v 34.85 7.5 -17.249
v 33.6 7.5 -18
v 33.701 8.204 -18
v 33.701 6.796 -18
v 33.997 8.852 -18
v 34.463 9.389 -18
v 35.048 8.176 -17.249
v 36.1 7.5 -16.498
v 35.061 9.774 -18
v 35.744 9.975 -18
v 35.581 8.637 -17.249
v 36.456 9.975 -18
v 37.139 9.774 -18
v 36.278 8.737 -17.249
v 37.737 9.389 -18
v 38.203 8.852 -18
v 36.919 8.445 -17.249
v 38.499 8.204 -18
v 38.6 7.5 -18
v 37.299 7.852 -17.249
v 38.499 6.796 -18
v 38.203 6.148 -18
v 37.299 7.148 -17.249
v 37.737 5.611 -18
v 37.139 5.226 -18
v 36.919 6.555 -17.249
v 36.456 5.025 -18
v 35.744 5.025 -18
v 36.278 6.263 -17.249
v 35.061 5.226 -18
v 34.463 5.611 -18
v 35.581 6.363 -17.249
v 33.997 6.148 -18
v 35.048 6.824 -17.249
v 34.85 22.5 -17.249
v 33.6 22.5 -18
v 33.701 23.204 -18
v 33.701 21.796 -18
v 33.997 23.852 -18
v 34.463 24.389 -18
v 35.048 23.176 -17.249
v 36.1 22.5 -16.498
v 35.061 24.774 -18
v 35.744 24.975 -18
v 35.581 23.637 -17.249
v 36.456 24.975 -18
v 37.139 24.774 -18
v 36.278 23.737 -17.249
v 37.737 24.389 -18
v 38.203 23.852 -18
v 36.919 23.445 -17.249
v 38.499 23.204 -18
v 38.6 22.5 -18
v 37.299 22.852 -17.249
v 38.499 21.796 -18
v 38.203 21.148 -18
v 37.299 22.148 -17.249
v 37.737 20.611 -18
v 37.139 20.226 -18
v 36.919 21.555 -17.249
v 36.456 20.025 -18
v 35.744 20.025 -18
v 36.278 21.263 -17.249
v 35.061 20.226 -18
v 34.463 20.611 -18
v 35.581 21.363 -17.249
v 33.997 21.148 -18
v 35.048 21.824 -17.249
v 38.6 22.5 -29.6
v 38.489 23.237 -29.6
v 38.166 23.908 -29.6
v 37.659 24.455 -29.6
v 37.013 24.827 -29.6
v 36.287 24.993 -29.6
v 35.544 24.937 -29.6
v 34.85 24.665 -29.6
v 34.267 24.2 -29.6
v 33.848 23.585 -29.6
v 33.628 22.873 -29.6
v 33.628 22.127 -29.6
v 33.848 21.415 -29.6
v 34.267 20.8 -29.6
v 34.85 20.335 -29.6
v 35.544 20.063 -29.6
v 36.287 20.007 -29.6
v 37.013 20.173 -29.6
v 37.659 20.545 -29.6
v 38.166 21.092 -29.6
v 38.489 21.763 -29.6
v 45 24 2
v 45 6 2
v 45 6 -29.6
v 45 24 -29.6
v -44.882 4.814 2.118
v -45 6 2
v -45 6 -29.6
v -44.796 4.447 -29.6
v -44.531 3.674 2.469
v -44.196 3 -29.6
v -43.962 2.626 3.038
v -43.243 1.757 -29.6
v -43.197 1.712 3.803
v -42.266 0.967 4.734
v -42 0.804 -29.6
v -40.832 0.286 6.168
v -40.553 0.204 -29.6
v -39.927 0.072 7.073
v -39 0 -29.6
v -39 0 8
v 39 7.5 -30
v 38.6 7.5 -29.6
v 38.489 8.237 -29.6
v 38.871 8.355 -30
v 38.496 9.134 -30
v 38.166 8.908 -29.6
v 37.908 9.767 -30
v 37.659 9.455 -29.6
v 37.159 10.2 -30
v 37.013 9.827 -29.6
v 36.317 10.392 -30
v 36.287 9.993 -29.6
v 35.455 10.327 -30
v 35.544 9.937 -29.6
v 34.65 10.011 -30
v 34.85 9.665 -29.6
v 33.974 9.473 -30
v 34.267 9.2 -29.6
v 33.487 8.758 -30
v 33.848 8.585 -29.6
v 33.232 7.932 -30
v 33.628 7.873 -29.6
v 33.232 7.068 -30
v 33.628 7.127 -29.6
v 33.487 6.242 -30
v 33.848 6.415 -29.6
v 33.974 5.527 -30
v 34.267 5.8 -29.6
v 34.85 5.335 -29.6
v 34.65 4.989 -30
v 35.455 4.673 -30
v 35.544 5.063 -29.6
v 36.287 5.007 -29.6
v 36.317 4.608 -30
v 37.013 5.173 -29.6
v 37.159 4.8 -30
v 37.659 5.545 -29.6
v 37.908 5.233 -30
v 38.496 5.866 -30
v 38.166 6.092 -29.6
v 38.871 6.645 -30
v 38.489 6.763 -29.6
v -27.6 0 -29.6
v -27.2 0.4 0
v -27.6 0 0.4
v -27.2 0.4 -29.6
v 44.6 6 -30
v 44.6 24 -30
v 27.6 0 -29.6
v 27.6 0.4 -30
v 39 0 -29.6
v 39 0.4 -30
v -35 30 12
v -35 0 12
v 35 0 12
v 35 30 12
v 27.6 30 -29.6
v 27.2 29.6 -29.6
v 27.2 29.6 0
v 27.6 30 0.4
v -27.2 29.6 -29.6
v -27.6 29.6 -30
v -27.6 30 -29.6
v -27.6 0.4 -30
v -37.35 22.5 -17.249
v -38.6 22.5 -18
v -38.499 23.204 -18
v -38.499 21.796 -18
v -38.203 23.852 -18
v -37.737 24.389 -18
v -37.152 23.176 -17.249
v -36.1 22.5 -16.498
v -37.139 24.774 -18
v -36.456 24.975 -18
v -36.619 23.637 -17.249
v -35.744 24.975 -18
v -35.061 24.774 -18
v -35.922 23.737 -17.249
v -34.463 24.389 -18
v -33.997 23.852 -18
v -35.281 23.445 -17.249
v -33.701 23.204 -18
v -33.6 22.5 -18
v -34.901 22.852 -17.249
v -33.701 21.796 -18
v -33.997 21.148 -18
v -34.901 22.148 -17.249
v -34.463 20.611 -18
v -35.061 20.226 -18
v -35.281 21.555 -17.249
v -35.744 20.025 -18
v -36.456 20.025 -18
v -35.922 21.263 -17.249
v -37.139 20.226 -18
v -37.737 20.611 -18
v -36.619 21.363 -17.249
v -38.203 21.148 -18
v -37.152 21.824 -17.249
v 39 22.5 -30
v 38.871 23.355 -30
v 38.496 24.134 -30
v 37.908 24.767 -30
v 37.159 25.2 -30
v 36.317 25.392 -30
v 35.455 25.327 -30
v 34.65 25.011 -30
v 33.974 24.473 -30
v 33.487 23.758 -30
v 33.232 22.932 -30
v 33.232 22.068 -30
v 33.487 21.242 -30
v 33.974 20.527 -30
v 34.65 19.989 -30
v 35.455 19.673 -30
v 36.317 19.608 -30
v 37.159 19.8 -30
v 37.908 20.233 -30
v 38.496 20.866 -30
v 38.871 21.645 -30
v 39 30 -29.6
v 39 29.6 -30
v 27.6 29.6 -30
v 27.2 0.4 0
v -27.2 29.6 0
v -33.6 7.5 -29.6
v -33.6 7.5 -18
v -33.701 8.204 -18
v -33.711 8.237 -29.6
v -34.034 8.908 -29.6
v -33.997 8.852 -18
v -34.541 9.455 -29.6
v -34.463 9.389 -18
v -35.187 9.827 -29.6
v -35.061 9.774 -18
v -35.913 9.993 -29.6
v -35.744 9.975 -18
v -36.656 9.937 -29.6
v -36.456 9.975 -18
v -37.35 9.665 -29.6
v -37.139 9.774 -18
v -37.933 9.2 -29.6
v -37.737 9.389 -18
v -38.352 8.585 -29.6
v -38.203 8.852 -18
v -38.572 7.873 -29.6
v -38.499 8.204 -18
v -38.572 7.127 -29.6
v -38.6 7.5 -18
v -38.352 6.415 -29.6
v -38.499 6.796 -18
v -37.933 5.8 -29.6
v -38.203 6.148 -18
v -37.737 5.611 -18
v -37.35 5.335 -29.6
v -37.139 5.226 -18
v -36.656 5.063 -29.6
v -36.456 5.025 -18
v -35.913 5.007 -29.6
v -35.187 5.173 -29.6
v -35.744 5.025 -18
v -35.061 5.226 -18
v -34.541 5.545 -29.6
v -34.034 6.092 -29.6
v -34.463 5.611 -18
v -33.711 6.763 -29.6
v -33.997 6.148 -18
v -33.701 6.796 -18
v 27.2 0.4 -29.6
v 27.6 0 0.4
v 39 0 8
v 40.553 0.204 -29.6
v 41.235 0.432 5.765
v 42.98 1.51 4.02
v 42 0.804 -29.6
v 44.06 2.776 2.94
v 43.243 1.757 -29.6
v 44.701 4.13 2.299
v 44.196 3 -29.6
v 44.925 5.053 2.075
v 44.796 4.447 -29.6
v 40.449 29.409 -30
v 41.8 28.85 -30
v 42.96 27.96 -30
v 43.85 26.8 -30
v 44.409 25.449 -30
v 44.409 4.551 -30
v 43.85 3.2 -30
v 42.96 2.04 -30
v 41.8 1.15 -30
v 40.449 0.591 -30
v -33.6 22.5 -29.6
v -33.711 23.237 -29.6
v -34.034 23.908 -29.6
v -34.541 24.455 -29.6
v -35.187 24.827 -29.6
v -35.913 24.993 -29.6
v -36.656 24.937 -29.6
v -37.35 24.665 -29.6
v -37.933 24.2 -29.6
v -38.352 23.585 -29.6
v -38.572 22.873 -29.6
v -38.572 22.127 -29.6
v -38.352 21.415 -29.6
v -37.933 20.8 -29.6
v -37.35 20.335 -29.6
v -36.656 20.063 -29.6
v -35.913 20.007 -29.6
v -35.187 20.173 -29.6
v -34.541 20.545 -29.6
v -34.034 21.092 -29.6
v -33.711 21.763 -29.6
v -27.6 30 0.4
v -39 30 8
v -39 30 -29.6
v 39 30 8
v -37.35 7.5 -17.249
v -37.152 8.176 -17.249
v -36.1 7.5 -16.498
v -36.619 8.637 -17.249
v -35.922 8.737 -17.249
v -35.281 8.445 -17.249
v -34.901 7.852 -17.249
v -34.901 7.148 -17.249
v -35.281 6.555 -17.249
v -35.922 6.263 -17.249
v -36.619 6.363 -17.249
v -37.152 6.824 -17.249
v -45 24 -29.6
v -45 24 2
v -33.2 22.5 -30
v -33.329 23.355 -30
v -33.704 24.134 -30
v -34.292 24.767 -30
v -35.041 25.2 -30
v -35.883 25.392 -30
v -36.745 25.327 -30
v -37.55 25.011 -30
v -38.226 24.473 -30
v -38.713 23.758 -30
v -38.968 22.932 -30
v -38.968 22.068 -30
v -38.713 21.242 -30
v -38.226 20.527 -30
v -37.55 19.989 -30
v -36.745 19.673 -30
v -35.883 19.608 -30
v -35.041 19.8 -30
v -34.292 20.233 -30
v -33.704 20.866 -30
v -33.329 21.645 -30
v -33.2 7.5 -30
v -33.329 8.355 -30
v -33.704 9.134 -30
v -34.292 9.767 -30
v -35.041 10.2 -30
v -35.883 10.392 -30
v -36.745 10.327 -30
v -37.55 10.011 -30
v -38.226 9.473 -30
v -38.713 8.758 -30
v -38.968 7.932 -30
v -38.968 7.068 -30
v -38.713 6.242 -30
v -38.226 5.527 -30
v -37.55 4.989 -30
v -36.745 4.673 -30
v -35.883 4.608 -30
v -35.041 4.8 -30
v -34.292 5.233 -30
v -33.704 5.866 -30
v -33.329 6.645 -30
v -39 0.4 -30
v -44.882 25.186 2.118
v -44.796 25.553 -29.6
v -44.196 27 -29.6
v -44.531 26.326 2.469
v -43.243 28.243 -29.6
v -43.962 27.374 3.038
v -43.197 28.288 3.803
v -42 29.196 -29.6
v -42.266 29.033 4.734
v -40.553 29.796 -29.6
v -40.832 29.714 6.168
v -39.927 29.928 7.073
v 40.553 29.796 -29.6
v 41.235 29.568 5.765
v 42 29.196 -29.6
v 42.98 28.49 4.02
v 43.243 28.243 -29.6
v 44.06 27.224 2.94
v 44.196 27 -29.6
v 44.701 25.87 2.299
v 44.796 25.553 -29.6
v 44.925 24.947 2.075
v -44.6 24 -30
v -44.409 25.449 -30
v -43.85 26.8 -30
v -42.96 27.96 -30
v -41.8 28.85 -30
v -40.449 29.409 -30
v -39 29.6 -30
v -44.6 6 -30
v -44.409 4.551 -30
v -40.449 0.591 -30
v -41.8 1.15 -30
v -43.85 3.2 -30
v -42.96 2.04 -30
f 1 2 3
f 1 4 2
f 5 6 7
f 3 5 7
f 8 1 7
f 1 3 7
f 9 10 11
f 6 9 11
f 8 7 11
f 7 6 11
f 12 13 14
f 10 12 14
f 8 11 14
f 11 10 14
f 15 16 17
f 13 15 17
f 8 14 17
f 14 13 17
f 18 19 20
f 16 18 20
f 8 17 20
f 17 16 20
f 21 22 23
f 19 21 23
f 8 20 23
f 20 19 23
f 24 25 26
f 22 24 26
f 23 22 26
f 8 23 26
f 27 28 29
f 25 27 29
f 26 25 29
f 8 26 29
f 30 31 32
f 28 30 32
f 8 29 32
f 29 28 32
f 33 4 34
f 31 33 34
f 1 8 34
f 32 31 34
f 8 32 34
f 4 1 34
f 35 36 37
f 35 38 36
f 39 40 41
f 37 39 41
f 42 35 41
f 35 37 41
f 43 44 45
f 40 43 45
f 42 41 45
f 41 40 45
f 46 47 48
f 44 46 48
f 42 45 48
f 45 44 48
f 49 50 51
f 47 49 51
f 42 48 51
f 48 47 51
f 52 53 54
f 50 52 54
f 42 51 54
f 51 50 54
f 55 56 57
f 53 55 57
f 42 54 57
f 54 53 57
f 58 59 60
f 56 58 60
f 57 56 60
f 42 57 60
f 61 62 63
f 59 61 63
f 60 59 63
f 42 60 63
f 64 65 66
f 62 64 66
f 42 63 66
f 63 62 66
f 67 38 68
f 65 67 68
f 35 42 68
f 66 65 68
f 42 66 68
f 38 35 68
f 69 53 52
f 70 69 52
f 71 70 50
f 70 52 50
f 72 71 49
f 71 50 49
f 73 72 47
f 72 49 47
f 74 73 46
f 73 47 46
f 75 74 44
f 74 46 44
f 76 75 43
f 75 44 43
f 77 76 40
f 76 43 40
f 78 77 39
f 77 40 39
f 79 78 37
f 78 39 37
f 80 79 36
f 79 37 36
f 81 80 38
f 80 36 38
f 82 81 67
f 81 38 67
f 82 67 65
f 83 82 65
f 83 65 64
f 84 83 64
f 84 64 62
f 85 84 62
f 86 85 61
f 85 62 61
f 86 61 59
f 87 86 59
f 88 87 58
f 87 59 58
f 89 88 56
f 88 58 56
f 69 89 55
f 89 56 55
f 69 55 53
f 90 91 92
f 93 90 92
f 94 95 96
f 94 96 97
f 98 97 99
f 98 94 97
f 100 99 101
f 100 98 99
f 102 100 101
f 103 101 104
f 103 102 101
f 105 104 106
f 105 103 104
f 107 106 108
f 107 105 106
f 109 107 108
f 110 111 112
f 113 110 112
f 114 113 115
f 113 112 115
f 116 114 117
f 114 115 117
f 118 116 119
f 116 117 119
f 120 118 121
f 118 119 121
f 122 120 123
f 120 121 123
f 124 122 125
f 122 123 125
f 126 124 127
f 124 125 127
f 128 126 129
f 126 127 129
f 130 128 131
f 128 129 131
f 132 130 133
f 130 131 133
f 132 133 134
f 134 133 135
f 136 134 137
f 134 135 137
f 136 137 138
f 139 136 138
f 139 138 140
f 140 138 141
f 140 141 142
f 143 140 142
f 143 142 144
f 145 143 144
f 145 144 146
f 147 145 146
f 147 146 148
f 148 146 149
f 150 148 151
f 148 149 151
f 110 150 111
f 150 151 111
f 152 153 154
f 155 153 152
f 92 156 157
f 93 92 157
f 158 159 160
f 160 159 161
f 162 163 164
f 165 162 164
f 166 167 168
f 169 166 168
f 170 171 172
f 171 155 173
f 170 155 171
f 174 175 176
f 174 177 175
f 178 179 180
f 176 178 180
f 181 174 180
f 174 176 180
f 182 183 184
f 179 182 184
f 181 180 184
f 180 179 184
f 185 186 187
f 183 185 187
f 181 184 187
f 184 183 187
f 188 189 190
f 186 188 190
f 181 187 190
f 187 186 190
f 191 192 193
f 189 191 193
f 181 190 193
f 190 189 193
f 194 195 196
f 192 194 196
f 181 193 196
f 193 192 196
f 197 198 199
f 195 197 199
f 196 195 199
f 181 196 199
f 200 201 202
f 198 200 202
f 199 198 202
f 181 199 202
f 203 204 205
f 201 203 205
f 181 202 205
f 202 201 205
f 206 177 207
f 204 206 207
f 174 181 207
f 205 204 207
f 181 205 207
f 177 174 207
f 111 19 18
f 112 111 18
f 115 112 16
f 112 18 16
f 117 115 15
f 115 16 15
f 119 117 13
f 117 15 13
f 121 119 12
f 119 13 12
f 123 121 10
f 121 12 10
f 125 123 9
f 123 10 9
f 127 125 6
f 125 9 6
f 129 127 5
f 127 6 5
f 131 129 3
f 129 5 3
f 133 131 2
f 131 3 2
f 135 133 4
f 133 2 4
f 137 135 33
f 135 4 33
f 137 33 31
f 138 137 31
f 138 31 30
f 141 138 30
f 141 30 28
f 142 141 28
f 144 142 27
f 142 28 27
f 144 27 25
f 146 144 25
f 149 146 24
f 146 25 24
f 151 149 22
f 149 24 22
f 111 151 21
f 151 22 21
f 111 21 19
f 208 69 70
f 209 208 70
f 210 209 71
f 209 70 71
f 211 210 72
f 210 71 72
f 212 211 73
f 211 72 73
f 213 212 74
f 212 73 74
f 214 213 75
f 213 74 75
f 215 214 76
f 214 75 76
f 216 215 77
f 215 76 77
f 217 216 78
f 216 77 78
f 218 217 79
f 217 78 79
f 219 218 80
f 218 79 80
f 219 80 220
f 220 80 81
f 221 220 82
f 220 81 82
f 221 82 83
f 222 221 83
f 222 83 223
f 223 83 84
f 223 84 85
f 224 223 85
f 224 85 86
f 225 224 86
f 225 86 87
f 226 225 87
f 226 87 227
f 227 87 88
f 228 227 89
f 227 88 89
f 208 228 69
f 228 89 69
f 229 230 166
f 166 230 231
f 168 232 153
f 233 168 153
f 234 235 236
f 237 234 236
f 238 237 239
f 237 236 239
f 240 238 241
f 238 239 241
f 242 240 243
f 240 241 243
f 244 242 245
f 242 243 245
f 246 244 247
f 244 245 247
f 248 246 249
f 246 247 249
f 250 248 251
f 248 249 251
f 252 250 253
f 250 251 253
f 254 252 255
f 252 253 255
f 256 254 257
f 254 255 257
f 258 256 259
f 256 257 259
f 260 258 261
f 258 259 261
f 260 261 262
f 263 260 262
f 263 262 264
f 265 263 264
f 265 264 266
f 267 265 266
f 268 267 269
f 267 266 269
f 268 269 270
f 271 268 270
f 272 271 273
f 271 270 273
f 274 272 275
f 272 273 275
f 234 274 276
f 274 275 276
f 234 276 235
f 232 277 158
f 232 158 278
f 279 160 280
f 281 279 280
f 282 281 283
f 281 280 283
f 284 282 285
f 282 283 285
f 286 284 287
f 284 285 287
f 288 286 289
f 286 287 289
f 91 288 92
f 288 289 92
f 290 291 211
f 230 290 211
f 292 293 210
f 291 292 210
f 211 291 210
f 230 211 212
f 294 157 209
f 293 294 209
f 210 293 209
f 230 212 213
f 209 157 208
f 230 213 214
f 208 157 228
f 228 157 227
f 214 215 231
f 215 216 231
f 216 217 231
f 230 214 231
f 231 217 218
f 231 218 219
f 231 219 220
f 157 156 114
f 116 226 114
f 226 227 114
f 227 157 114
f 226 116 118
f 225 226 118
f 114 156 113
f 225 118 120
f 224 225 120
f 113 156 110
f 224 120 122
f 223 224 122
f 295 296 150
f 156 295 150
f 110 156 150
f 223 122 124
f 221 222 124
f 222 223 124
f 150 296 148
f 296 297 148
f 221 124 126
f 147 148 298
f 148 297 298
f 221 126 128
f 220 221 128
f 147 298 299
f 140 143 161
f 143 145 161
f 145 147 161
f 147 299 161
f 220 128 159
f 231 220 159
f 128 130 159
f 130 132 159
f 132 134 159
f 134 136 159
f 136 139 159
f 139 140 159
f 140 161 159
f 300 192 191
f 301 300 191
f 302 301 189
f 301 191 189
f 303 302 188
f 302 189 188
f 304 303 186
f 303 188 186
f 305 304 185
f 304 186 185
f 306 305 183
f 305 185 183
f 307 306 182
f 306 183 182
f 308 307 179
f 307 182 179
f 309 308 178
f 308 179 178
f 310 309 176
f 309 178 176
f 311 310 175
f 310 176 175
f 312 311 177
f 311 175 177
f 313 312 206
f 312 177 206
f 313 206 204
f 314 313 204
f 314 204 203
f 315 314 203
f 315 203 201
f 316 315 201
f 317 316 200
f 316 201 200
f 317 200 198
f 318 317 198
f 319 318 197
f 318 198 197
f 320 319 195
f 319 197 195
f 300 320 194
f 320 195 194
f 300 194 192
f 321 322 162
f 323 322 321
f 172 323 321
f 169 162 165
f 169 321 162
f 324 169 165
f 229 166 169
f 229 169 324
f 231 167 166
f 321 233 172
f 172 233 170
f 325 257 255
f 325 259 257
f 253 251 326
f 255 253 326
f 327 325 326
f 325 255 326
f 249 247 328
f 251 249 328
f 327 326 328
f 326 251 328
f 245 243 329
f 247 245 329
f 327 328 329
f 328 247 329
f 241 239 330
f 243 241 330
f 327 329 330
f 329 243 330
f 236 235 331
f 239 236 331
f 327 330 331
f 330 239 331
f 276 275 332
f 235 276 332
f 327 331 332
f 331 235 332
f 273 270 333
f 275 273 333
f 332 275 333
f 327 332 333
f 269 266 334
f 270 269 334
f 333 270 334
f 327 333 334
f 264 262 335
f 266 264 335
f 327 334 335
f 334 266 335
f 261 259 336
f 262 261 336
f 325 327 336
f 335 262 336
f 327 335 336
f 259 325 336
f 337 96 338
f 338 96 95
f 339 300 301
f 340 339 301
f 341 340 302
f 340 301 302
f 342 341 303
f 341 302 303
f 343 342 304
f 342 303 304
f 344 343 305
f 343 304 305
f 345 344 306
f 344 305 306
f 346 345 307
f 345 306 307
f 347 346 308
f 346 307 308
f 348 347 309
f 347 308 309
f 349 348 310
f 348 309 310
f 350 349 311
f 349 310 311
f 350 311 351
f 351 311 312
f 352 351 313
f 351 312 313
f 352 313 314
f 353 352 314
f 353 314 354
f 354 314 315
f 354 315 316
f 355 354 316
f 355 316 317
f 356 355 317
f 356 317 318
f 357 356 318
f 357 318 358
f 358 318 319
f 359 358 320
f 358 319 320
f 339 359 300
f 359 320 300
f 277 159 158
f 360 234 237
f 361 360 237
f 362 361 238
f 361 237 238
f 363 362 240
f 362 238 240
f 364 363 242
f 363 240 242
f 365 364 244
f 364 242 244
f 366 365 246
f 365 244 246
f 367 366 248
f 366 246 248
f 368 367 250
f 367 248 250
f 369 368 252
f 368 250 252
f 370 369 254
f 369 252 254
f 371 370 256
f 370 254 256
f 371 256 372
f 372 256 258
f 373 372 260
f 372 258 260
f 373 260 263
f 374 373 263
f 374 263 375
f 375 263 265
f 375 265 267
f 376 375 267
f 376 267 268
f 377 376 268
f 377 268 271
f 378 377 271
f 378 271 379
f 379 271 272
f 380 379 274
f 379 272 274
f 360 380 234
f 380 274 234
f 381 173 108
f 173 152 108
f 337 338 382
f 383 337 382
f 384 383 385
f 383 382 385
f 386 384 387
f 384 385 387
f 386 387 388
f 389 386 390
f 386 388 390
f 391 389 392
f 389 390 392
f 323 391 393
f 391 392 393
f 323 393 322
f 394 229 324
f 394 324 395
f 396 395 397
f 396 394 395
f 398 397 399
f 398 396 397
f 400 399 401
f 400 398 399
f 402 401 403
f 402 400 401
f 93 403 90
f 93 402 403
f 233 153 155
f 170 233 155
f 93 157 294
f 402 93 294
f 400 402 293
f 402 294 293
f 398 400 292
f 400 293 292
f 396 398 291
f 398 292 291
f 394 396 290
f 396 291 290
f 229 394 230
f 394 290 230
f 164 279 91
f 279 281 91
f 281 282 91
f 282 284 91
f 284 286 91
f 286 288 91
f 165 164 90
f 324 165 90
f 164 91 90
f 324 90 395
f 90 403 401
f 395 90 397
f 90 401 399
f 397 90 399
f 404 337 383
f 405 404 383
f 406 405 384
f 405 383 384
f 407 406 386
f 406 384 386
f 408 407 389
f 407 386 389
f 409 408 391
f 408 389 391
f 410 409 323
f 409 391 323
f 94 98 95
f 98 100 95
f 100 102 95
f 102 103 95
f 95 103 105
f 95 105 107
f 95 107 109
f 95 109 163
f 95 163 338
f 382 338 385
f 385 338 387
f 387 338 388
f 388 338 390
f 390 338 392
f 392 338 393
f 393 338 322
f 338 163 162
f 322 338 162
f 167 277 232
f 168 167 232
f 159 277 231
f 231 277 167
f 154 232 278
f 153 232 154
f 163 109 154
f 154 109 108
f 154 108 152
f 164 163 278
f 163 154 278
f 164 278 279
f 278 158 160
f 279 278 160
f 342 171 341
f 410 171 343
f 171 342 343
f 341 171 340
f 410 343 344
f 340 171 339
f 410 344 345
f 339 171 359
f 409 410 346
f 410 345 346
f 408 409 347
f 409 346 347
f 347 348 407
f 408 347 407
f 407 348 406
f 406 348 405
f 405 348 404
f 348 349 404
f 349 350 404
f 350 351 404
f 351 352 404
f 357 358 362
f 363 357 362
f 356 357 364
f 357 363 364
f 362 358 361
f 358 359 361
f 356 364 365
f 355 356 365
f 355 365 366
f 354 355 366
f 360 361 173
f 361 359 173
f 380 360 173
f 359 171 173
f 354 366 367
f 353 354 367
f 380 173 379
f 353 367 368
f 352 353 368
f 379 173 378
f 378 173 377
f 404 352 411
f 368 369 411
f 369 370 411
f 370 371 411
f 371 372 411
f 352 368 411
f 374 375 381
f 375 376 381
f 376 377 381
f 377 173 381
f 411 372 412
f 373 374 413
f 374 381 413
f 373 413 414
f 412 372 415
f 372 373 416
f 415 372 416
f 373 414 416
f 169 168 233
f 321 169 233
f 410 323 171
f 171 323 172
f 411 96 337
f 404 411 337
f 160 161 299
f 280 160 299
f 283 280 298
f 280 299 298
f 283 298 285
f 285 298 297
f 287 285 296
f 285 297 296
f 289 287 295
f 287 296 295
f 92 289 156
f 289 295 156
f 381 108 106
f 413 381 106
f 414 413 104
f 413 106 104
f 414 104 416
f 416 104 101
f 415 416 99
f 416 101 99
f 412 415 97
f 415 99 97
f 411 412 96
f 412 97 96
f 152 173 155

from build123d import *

# Parameters (mm, degrees)
BOSS_EXTRUDE1_DEPTH       = 30
CHAMFER1_SIZE             = 10
FILLET1_R                 = 6
F_5_0MM_DOWEL_HOLE1_D     = 5
F_5_0MM_DOWEL_HOLE1_DEPTH = 12
F_5_0MM_DOWEL_HOLE1_TIP   = 1.502151548
CHAMFER2_SIZE             = 0.4


with BuildPart() as part:
    # Sketch1 → Boss-Extrude1 (new body)
    with BuildSketch(Plane(origin=(0, 0, 0), x_dir=(1, 0, 0), z_dir=(0, 1, 0))):
        Polygon((-45, 30), (-45, -12), (45, -12), (45, 30), (27.2, 30), (27.2, 0), (-27.2, 0), (-27.2, 30), align=None)
    extrude(amount=BOSS_EXTRUDE1_DEPTH)

    # Chamfer1
    chamfer1_edges = [part.edges().sort_by_distance(p)[0] for p in [
        (45, 15, 12),
        (-45, 15, 12),
    ]]
    chamfer(chamfer1_edges, length=CHAMFER1_SIZE)

    # Fillet1
    fillet1_edges = [part.edges().sort_by_distance(p)[0] for p in [
        (-45, 0, -14),
        (45, 0, -14),
        (45, 30, -14),
        (-45, 30, -14),
    ]]
    fillet(fillet1_edges, radius=FILLET1_R)

    # Ø5.0mm Dowel Hole1
    with Locations(Plane(origin=(0, 0, -30), x_dir=(-1, 0, 0), z_dir=(0, 0, -1))):
        with Locations((-36.1, 7.5), (36.1, 22.5), (36.1, 7.5), (-36.1, 22.5)):
            Hole(F_5_0MM_DOWEL_HOLE1_D / 2, depth=F_5_0MM_DOWEL_HOLE1_DEPTH)
            with Locations((0, 0, -(F_5_0MM_DOWEL_HOLE1_DEPTH + F_5_0MM_DOWEL_HOLE1_TIP / 2))):  # 118° drill point
                Cone(0, F_5_0MM_DOWEL_HOLE1_D / 2, F_5_0MM_DOWEL_HOLE1_TIP, mode=Mode.SUBTRACT)

    # Chamfer2
    chamfer2_edges = [part.edges().sort_by_distance(p)[0] for p in [
        (-33.1, 0, -30),
        (-27.2, 15, -30),
        (27.2, 15, -30),
        (27.2, 30, -15),
        (0, 30, 0),
        (-27.2, 30, -15),
        (33.1, 30, -30),
        (-45, 15, -30),
        (-43.242640687, 1.757359313, -30),
        (-43.242640687, 28.242640687, -30),
        (33.1, 0, -30),
        (45, 15, -30),
        (43.242640687, 1.757359313, -30),
        (-33.1, 30, -30),
        (43.242640687, 28.242640687, -30),
        (33.6, 7.5, -30),
        (33.6, 22.5, -30),
        (-38.6, 7.5, -30),
        (-38.6, 22.5, -30),
        (-27.2, 0, -15),
        (0, 0, 0),
        (27.2, 0, -15),
    ]]
    chamfer(chamfer2_edges, length=CHAMFER2_SIZE)


solid = part.part
